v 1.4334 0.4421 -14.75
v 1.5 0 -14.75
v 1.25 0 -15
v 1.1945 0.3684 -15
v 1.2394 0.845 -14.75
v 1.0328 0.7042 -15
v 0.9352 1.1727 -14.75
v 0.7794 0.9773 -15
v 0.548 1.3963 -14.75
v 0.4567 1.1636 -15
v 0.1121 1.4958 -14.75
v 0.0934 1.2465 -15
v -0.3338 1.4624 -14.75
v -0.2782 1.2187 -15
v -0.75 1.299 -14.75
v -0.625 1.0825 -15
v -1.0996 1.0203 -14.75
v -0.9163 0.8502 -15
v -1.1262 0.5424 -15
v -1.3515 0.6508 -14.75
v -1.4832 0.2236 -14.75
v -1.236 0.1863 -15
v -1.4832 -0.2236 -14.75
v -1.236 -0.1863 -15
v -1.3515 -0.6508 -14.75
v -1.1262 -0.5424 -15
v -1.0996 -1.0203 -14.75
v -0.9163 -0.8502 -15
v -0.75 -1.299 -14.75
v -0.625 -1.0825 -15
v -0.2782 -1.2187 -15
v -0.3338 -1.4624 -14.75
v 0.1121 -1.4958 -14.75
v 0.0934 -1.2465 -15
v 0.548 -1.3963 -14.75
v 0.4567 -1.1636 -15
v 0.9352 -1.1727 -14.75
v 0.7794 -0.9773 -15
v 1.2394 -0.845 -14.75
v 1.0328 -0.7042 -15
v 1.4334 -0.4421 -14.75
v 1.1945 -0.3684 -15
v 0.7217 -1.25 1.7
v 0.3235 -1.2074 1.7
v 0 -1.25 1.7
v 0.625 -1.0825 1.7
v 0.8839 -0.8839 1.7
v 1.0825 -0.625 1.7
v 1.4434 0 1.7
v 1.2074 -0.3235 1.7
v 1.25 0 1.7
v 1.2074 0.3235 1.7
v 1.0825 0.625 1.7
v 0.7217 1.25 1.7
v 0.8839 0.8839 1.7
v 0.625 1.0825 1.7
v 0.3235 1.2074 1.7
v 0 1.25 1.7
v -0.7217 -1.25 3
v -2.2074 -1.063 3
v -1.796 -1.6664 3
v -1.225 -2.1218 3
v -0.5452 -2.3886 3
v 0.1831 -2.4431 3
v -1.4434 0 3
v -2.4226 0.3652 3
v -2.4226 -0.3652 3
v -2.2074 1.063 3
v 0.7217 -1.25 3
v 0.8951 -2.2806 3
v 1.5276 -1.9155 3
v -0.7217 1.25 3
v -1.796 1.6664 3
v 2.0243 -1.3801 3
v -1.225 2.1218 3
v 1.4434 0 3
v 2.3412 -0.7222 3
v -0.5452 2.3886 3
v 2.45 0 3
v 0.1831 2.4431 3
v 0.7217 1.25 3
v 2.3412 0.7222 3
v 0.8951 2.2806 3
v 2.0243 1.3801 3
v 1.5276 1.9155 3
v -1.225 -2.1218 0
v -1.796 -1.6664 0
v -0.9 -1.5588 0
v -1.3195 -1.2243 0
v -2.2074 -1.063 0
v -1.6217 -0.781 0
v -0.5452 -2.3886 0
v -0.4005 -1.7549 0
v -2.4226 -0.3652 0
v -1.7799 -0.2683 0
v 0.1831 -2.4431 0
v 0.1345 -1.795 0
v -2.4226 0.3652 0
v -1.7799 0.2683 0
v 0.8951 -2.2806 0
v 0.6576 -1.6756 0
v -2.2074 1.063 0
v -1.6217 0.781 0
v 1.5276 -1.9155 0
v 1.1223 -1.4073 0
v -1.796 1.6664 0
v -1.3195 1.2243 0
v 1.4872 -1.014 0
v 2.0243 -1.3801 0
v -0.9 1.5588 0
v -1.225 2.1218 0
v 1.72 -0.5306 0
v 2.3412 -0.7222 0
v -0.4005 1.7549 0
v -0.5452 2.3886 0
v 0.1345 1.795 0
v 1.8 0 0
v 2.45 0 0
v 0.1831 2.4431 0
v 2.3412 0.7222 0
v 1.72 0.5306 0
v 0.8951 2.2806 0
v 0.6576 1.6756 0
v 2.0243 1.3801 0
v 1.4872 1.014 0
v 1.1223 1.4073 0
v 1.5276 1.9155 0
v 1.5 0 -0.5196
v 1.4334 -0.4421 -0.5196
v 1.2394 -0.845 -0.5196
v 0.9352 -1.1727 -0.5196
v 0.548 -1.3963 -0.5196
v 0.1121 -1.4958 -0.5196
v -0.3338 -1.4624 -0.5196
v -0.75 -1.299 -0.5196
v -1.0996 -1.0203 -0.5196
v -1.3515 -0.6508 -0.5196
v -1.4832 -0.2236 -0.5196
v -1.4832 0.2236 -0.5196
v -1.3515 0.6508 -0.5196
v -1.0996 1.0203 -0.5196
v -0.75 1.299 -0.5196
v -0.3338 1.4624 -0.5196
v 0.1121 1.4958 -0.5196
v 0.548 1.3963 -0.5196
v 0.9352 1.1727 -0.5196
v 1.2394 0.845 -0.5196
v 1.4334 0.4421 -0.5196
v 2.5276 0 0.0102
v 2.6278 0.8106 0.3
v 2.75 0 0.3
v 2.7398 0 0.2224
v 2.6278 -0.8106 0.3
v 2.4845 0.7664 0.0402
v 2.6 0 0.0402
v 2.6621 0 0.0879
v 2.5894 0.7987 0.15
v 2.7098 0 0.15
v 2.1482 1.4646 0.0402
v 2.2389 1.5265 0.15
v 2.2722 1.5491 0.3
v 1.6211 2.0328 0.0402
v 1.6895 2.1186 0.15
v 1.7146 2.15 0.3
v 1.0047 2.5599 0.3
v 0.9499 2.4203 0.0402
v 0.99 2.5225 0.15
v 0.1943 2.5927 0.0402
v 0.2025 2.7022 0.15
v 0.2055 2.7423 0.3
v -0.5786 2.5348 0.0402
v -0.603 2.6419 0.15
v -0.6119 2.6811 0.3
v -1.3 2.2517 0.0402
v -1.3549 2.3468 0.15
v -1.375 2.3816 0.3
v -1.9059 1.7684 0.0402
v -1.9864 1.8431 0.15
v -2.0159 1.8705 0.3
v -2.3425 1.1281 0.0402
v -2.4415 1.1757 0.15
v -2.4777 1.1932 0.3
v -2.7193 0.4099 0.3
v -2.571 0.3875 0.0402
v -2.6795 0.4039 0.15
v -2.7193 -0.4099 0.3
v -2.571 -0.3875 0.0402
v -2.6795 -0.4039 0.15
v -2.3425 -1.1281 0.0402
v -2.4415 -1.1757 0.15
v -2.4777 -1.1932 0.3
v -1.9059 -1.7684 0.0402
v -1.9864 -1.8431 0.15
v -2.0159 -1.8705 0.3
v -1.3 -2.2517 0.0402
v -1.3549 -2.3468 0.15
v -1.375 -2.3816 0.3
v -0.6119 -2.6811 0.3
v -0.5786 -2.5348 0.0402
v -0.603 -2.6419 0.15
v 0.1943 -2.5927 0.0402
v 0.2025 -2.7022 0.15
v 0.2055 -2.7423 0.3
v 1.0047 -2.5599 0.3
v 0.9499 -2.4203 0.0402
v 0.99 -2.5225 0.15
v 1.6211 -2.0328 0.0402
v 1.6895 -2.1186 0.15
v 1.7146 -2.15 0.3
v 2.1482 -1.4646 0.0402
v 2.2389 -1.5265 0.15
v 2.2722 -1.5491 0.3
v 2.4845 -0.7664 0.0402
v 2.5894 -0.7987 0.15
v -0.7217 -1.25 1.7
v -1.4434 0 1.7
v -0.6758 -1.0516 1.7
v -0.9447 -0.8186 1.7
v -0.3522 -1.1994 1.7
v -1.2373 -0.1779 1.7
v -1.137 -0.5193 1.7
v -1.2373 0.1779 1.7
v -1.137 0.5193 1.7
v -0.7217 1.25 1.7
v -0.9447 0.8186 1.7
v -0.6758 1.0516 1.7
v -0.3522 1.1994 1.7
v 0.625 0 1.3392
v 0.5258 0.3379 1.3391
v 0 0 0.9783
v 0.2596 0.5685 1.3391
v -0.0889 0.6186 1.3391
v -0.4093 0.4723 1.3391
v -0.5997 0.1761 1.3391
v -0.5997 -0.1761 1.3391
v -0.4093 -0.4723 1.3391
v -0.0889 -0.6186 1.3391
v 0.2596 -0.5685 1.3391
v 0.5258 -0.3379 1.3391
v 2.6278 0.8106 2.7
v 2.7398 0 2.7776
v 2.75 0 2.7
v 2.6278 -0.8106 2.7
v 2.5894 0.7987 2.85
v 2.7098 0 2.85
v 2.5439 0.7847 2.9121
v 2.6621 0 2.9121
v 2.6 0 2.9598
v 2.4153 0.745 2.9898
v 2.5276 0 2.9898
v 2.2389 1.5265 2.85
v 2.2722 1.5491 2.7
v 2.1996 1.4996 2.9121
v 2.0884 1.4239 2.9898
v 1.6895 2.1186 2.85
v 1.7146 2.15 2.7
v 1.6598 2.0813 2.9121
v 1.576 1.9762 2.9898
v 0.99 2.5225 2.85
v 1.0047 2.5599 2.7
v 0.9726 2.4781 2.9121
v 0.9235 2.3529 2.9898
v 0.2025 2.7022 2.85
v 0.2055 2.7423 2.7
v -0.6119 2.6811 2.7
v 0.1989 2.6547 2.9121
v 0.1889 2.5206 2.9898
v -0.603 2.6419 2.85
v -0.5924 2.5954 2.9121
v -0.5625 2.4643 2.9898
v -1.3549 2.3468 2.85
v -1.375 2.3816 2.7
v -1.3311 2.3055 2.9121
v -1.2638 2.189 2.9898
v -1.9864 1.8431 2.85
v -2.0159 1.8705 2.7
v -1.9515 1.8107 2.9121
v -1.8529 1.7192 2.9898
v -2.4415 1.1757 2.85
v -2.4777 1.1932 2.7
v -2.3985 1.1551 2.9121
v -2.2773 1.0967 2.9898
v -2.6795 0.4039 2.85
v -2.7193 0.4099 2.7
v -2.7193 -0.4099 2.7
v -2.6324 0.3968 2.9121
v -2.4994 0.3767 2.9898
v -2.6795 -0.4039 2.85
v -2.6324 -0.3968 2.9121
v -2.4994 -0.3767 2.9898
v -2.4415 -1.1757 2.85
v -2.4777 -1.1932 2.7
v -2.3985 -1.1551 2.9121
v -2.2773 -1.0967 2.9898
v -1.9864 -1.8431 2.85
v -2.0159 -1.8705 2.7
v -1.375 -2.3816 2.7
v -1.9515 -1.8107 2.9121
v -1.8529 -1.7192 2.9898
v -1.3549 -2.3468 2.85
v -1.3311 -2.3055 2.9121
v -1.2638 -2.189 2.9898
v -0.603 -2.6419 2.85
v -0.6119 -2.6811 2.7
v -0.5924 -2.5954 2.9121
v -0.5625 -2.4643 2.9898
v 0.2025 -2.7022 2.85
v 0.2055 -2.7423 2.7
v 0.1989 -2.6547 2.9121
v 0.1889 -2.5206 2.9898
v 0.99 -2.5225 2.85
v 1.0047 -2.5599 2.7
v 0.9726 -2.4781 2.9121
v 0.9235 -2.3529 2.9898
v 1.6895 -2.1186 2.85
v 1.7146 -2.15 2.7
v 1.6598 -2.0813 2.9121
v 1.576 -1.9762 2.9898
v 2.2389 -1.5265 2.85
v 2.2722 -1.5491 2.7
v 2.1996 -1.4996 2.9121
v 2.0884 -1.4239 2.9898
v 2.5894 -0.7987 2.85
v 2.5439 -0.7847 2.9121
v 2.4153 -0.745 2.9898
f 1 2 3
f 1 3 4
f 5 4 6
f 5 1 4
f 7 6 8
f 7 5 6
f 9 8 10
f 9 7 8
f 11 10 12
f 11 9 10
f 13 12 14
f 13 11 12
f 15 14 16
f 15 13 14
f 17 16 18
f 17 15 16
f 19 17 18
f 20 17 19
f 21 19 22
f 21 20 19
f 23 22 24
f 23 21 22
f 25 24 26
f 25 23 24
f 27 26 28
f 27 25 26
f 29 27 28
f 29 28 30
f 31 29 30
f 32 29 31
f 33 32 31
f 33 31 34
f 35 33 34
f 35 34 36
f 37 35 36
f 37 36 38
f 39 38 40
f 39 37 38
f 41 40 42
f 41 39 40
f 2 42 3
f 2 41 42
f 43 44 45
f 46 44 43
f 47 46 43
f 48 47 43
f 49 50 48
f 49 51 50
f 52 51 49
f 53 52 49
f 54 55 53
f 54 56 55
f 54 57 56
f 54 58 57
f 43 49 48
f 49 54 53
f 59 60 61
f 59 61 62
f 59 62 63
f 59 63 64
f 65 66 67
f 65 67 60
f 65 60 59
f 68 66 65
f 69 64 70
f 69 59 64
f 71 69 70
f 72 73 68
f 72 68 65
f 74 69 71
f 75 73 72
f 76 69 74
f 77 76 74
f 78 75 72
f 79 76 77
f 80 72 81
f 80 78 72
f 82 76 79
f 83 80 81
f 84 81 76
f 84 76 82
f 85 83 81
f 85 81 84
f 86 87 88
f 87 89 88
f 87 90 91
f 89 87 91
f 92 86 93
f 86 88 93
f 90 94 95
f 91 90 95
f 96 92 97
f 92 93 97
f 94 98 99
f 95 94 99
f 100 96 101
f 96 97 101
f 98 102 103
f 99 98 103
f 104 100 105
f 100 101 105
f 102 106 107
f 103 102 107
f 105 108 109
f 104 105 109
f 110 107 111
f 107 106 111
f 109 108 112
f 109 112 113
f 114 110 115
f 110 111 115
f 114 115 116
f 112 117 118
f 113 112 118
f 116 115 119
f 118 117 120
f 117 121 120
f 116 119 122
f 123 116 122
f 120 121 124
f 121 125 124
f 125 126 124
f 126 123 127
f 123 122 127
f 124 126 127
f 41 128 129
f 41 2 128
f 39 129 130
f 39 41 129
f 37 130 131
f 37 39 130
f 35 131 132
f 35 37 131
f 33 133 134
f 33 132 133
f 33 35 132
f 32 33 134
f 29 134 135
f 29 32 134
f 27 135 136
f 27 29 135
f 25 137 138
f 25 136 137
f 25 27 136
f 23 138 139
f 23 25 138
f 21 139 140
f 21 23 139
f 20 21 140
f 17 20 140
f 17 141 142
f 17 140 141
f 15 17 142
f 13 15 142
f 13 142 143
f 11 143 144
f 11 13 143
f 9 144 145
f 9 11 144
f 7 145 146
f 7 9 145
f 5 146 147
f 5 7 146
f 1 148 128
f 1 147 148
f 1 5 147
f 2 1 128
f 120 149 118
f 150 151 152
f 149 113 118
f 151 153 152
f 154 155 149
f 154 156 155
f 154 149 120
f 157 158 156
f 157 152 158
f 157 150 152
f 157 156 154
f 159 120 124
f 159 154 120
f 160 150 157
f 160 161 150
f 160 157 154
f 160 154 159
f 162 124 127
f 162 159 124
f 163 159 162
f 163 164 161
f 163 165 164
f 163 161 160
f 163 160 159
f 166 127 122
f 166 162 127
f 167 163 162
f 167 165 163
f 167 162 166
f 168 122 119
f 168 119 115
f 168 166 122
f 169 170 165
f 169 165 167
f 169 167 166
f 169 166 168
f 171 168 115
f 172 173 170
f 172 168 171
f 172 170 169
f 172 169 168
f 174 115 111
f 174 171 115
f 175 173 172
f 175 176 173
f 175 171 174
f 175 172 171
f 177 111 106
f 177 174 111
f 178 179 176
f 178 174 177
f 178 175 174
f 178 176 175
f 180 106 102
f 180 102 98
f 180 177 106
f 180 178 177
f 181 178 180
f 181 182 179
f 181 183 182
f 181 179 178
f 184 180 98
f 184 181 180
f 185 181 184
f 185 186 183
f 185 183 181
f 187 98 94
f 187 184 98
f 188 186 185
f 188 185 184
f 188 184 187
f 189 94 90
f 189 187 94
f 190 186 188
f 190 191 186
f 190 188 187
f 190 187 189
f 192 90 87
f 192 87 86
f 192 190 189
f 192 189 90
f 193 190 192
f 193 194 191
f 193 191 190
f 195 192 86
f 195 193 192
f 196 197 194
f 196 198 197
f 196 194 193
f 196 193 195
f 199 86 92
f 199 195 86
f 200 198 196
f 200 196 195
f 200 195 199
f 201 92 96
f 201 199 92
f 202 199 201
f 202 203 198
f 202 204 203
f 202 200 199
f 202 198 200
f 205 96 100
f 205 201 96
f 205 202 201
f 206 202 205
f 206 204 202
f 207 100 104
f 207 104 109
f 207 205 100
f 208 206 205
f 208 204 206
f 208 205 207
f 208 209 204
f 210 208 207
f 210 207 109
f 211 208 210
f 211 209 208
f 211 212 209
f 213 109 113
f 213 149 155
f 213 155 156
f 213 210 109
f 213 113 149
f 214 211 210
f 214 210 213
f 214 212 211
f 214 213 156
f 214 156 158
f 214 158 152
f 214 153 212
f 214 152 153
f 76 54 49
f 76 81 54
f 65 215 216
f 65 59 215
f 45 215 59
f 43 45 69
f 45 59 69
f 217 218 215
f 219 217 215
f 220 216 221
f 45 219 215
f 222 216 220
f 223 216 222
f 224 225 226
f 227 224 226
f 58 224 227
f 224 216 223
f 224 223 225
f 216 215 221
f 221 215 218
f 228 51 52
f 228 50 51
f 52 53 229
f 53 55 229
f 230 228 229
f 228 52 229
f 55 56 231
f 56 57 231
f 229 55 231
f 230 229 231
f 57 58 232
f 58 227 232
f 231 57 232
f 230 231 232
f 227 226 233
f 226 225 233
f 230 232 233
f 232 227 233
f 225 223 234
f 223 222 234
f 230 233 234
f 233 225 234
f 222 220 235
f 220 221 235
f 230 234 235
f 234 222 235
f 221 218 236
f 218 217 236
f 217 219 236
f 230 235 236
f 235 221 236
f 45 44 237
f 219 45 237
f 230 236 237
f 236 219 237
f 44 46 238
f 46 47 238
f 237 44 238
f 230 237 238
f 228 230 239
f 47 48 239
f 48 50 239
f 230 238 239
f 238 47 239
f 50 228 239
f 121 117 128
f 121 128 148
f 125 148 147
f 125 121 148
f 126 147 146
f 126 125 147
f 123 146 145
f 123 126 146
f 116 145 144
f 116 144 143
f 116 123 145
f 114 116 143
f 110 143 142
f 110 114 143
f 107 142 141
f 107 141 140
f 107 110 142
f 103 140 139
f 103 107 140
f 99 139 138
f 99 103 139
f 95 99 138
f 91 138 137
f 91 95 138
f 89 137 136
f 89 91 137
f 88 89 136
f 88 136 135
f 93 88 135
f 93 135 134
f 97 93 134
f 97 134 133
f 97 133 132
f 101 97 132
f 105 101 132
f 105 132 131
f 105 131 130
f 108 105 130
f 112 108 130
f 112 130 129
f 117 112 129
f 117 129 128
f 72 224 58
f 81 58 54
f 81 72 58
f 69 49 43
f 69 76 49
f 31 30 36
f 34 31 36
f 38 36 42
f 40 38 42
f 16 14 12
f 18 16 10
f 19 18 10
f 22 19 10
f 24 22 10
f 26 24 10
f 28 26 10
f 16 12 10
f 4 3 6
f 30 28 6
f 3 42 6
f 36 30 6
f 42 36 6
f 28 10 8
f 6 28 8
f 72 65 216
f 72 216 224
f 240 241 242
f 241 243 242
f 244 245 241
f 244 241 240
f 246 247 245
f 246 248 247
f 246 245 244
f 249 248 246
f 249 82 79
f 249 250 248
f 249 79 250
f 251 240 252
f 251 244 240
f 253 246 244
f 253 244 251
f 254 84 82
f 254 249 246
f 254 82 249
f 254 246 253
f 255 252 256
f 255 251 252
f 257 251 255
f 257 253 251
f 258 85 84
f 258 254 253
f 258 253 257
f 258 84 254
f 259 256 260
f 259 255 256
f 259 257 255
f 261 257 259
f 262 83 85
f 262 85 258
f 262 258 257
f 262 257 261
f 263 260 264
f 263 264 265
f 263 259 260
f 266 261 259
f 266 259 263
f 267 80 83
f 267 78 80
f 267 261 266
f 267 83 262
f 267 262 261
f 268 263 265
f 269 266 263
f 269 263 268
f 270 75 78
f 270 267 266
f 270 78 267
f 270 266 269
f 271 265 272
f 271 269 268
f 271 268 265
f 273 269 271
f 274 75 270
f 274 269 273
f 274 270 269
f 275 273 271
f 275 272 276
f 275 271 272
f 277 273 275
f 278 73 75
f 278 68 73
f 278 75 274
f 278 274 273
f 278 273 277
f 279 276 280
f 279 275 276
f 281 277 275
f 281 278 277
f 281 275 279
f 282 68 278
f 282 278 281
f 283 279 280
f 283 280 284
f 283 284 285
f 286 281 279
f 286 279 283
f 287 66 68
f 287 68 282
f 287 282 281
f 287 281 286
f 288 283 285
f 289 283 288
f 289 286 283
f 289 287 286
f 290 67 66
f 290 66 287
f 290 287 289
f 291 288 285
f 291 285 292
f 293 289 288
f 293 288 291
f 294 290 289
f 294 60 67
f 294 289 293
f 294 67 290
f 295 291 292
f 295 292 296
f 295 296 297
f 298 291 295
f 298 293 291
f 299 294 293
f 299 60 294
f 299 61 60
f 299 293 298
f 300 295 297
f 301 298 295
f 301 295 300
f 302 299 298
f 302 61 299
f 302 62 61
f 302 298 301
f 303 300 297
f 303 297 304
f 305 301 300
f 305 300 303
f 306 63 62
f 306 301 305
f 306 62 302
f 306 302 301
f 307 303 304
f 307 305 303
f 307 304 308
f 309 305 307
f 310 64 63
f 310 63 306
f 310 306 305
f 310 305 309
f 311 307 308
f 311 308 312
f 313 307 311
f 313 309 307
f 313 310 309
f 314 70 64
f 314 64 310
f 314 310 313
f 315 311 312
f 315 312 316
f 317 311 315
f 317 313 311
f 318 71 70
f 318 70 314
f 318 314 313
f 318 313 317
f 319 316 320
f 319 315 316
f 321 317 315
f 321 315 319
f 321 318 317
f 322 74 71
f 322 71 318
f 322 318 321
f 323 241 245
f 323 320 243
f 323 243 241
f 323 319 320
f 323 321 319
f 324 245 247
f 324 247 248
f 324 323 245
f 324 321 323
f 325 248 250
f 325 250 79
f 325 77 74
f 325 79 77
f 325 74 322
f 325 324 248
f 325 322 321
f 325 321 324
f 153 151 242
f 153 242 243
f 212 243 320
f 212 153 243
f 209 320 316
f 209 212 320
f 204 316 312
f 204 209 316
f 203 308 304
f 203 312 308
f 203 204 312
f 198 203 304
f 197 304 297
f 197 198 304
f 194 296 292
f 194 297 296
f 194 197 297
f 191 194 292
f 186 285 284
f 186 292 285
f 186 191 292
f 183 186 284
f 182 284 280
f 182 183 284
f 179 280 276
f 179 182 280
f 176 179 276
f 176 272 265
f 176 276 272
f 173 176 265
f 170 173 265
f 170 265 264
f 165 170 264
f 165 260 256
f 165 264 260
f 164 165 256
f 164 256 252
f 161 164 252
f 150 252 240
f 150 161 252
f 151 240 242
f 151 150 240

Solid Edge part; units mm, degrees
sketch "Sketch1" plane through (0, 0, 0) normal (0, -1, 0) x (1, 0, 0)
  line L0 (2.75, 3) -> (2.75, 0)
  line L1 (2.75, 0) -> (1.8, 0)
  line L2 (1.8, 0) -> (1.5, -0.5196)
  line L3 (1.5, -0.5196) -> (1.5, -15)
  line L4 (1.5, -15) -> (0, -15)
  line L5 (1.25, 1.7) -> (0, 0.9783)
  line L6 (1.25, 3) -> (1.25, 1.7)
  line L7 (2.75, 3) -> (1.25, 3)
  dimension "D1" = 1.3
  dimension "D2" = 15
  dimension "D3" = 3
revolve "RevolvedProtrusion1" add sketch "Sketch1" angle 360 about axis through (0, 0, -6) along (0, 0, 1)
cosmetic_thread "Thread1" size "M3"
chamfer "Chamfer_1" distance 0.25 angle 45 1 edges at (-1.5, 0, -15)
fillet "Round_1" radius 0.3 2 edges at (-2.75, 0, 0) (-2.75, 0, 3)
sketch "Sketch2" plane through (0, 0, 3) normal (0, 0, 1) x (0, 1, 0)
  line L0 (-1.25, 0.7217) -> (-1.25, -0.7217)
  line L1 (0, -1.4434) -> (-1.25, -0.7217)
  line L2 (1.25, -0.7217) -> (0, -1.4434)
  line L3 (1.25, 0.7217) -> (1.25, -0.7217)
  line L4 (0, 1.4434) -> (1.25, 0.7217)
  line L5 (-1.25, 0.7217) -> (0, 1.4434)
extrude "Cutout1" cut sketch "Sketch2" against normal up to vertex (1.3 mm away)
properties material "Galvanized steel"
